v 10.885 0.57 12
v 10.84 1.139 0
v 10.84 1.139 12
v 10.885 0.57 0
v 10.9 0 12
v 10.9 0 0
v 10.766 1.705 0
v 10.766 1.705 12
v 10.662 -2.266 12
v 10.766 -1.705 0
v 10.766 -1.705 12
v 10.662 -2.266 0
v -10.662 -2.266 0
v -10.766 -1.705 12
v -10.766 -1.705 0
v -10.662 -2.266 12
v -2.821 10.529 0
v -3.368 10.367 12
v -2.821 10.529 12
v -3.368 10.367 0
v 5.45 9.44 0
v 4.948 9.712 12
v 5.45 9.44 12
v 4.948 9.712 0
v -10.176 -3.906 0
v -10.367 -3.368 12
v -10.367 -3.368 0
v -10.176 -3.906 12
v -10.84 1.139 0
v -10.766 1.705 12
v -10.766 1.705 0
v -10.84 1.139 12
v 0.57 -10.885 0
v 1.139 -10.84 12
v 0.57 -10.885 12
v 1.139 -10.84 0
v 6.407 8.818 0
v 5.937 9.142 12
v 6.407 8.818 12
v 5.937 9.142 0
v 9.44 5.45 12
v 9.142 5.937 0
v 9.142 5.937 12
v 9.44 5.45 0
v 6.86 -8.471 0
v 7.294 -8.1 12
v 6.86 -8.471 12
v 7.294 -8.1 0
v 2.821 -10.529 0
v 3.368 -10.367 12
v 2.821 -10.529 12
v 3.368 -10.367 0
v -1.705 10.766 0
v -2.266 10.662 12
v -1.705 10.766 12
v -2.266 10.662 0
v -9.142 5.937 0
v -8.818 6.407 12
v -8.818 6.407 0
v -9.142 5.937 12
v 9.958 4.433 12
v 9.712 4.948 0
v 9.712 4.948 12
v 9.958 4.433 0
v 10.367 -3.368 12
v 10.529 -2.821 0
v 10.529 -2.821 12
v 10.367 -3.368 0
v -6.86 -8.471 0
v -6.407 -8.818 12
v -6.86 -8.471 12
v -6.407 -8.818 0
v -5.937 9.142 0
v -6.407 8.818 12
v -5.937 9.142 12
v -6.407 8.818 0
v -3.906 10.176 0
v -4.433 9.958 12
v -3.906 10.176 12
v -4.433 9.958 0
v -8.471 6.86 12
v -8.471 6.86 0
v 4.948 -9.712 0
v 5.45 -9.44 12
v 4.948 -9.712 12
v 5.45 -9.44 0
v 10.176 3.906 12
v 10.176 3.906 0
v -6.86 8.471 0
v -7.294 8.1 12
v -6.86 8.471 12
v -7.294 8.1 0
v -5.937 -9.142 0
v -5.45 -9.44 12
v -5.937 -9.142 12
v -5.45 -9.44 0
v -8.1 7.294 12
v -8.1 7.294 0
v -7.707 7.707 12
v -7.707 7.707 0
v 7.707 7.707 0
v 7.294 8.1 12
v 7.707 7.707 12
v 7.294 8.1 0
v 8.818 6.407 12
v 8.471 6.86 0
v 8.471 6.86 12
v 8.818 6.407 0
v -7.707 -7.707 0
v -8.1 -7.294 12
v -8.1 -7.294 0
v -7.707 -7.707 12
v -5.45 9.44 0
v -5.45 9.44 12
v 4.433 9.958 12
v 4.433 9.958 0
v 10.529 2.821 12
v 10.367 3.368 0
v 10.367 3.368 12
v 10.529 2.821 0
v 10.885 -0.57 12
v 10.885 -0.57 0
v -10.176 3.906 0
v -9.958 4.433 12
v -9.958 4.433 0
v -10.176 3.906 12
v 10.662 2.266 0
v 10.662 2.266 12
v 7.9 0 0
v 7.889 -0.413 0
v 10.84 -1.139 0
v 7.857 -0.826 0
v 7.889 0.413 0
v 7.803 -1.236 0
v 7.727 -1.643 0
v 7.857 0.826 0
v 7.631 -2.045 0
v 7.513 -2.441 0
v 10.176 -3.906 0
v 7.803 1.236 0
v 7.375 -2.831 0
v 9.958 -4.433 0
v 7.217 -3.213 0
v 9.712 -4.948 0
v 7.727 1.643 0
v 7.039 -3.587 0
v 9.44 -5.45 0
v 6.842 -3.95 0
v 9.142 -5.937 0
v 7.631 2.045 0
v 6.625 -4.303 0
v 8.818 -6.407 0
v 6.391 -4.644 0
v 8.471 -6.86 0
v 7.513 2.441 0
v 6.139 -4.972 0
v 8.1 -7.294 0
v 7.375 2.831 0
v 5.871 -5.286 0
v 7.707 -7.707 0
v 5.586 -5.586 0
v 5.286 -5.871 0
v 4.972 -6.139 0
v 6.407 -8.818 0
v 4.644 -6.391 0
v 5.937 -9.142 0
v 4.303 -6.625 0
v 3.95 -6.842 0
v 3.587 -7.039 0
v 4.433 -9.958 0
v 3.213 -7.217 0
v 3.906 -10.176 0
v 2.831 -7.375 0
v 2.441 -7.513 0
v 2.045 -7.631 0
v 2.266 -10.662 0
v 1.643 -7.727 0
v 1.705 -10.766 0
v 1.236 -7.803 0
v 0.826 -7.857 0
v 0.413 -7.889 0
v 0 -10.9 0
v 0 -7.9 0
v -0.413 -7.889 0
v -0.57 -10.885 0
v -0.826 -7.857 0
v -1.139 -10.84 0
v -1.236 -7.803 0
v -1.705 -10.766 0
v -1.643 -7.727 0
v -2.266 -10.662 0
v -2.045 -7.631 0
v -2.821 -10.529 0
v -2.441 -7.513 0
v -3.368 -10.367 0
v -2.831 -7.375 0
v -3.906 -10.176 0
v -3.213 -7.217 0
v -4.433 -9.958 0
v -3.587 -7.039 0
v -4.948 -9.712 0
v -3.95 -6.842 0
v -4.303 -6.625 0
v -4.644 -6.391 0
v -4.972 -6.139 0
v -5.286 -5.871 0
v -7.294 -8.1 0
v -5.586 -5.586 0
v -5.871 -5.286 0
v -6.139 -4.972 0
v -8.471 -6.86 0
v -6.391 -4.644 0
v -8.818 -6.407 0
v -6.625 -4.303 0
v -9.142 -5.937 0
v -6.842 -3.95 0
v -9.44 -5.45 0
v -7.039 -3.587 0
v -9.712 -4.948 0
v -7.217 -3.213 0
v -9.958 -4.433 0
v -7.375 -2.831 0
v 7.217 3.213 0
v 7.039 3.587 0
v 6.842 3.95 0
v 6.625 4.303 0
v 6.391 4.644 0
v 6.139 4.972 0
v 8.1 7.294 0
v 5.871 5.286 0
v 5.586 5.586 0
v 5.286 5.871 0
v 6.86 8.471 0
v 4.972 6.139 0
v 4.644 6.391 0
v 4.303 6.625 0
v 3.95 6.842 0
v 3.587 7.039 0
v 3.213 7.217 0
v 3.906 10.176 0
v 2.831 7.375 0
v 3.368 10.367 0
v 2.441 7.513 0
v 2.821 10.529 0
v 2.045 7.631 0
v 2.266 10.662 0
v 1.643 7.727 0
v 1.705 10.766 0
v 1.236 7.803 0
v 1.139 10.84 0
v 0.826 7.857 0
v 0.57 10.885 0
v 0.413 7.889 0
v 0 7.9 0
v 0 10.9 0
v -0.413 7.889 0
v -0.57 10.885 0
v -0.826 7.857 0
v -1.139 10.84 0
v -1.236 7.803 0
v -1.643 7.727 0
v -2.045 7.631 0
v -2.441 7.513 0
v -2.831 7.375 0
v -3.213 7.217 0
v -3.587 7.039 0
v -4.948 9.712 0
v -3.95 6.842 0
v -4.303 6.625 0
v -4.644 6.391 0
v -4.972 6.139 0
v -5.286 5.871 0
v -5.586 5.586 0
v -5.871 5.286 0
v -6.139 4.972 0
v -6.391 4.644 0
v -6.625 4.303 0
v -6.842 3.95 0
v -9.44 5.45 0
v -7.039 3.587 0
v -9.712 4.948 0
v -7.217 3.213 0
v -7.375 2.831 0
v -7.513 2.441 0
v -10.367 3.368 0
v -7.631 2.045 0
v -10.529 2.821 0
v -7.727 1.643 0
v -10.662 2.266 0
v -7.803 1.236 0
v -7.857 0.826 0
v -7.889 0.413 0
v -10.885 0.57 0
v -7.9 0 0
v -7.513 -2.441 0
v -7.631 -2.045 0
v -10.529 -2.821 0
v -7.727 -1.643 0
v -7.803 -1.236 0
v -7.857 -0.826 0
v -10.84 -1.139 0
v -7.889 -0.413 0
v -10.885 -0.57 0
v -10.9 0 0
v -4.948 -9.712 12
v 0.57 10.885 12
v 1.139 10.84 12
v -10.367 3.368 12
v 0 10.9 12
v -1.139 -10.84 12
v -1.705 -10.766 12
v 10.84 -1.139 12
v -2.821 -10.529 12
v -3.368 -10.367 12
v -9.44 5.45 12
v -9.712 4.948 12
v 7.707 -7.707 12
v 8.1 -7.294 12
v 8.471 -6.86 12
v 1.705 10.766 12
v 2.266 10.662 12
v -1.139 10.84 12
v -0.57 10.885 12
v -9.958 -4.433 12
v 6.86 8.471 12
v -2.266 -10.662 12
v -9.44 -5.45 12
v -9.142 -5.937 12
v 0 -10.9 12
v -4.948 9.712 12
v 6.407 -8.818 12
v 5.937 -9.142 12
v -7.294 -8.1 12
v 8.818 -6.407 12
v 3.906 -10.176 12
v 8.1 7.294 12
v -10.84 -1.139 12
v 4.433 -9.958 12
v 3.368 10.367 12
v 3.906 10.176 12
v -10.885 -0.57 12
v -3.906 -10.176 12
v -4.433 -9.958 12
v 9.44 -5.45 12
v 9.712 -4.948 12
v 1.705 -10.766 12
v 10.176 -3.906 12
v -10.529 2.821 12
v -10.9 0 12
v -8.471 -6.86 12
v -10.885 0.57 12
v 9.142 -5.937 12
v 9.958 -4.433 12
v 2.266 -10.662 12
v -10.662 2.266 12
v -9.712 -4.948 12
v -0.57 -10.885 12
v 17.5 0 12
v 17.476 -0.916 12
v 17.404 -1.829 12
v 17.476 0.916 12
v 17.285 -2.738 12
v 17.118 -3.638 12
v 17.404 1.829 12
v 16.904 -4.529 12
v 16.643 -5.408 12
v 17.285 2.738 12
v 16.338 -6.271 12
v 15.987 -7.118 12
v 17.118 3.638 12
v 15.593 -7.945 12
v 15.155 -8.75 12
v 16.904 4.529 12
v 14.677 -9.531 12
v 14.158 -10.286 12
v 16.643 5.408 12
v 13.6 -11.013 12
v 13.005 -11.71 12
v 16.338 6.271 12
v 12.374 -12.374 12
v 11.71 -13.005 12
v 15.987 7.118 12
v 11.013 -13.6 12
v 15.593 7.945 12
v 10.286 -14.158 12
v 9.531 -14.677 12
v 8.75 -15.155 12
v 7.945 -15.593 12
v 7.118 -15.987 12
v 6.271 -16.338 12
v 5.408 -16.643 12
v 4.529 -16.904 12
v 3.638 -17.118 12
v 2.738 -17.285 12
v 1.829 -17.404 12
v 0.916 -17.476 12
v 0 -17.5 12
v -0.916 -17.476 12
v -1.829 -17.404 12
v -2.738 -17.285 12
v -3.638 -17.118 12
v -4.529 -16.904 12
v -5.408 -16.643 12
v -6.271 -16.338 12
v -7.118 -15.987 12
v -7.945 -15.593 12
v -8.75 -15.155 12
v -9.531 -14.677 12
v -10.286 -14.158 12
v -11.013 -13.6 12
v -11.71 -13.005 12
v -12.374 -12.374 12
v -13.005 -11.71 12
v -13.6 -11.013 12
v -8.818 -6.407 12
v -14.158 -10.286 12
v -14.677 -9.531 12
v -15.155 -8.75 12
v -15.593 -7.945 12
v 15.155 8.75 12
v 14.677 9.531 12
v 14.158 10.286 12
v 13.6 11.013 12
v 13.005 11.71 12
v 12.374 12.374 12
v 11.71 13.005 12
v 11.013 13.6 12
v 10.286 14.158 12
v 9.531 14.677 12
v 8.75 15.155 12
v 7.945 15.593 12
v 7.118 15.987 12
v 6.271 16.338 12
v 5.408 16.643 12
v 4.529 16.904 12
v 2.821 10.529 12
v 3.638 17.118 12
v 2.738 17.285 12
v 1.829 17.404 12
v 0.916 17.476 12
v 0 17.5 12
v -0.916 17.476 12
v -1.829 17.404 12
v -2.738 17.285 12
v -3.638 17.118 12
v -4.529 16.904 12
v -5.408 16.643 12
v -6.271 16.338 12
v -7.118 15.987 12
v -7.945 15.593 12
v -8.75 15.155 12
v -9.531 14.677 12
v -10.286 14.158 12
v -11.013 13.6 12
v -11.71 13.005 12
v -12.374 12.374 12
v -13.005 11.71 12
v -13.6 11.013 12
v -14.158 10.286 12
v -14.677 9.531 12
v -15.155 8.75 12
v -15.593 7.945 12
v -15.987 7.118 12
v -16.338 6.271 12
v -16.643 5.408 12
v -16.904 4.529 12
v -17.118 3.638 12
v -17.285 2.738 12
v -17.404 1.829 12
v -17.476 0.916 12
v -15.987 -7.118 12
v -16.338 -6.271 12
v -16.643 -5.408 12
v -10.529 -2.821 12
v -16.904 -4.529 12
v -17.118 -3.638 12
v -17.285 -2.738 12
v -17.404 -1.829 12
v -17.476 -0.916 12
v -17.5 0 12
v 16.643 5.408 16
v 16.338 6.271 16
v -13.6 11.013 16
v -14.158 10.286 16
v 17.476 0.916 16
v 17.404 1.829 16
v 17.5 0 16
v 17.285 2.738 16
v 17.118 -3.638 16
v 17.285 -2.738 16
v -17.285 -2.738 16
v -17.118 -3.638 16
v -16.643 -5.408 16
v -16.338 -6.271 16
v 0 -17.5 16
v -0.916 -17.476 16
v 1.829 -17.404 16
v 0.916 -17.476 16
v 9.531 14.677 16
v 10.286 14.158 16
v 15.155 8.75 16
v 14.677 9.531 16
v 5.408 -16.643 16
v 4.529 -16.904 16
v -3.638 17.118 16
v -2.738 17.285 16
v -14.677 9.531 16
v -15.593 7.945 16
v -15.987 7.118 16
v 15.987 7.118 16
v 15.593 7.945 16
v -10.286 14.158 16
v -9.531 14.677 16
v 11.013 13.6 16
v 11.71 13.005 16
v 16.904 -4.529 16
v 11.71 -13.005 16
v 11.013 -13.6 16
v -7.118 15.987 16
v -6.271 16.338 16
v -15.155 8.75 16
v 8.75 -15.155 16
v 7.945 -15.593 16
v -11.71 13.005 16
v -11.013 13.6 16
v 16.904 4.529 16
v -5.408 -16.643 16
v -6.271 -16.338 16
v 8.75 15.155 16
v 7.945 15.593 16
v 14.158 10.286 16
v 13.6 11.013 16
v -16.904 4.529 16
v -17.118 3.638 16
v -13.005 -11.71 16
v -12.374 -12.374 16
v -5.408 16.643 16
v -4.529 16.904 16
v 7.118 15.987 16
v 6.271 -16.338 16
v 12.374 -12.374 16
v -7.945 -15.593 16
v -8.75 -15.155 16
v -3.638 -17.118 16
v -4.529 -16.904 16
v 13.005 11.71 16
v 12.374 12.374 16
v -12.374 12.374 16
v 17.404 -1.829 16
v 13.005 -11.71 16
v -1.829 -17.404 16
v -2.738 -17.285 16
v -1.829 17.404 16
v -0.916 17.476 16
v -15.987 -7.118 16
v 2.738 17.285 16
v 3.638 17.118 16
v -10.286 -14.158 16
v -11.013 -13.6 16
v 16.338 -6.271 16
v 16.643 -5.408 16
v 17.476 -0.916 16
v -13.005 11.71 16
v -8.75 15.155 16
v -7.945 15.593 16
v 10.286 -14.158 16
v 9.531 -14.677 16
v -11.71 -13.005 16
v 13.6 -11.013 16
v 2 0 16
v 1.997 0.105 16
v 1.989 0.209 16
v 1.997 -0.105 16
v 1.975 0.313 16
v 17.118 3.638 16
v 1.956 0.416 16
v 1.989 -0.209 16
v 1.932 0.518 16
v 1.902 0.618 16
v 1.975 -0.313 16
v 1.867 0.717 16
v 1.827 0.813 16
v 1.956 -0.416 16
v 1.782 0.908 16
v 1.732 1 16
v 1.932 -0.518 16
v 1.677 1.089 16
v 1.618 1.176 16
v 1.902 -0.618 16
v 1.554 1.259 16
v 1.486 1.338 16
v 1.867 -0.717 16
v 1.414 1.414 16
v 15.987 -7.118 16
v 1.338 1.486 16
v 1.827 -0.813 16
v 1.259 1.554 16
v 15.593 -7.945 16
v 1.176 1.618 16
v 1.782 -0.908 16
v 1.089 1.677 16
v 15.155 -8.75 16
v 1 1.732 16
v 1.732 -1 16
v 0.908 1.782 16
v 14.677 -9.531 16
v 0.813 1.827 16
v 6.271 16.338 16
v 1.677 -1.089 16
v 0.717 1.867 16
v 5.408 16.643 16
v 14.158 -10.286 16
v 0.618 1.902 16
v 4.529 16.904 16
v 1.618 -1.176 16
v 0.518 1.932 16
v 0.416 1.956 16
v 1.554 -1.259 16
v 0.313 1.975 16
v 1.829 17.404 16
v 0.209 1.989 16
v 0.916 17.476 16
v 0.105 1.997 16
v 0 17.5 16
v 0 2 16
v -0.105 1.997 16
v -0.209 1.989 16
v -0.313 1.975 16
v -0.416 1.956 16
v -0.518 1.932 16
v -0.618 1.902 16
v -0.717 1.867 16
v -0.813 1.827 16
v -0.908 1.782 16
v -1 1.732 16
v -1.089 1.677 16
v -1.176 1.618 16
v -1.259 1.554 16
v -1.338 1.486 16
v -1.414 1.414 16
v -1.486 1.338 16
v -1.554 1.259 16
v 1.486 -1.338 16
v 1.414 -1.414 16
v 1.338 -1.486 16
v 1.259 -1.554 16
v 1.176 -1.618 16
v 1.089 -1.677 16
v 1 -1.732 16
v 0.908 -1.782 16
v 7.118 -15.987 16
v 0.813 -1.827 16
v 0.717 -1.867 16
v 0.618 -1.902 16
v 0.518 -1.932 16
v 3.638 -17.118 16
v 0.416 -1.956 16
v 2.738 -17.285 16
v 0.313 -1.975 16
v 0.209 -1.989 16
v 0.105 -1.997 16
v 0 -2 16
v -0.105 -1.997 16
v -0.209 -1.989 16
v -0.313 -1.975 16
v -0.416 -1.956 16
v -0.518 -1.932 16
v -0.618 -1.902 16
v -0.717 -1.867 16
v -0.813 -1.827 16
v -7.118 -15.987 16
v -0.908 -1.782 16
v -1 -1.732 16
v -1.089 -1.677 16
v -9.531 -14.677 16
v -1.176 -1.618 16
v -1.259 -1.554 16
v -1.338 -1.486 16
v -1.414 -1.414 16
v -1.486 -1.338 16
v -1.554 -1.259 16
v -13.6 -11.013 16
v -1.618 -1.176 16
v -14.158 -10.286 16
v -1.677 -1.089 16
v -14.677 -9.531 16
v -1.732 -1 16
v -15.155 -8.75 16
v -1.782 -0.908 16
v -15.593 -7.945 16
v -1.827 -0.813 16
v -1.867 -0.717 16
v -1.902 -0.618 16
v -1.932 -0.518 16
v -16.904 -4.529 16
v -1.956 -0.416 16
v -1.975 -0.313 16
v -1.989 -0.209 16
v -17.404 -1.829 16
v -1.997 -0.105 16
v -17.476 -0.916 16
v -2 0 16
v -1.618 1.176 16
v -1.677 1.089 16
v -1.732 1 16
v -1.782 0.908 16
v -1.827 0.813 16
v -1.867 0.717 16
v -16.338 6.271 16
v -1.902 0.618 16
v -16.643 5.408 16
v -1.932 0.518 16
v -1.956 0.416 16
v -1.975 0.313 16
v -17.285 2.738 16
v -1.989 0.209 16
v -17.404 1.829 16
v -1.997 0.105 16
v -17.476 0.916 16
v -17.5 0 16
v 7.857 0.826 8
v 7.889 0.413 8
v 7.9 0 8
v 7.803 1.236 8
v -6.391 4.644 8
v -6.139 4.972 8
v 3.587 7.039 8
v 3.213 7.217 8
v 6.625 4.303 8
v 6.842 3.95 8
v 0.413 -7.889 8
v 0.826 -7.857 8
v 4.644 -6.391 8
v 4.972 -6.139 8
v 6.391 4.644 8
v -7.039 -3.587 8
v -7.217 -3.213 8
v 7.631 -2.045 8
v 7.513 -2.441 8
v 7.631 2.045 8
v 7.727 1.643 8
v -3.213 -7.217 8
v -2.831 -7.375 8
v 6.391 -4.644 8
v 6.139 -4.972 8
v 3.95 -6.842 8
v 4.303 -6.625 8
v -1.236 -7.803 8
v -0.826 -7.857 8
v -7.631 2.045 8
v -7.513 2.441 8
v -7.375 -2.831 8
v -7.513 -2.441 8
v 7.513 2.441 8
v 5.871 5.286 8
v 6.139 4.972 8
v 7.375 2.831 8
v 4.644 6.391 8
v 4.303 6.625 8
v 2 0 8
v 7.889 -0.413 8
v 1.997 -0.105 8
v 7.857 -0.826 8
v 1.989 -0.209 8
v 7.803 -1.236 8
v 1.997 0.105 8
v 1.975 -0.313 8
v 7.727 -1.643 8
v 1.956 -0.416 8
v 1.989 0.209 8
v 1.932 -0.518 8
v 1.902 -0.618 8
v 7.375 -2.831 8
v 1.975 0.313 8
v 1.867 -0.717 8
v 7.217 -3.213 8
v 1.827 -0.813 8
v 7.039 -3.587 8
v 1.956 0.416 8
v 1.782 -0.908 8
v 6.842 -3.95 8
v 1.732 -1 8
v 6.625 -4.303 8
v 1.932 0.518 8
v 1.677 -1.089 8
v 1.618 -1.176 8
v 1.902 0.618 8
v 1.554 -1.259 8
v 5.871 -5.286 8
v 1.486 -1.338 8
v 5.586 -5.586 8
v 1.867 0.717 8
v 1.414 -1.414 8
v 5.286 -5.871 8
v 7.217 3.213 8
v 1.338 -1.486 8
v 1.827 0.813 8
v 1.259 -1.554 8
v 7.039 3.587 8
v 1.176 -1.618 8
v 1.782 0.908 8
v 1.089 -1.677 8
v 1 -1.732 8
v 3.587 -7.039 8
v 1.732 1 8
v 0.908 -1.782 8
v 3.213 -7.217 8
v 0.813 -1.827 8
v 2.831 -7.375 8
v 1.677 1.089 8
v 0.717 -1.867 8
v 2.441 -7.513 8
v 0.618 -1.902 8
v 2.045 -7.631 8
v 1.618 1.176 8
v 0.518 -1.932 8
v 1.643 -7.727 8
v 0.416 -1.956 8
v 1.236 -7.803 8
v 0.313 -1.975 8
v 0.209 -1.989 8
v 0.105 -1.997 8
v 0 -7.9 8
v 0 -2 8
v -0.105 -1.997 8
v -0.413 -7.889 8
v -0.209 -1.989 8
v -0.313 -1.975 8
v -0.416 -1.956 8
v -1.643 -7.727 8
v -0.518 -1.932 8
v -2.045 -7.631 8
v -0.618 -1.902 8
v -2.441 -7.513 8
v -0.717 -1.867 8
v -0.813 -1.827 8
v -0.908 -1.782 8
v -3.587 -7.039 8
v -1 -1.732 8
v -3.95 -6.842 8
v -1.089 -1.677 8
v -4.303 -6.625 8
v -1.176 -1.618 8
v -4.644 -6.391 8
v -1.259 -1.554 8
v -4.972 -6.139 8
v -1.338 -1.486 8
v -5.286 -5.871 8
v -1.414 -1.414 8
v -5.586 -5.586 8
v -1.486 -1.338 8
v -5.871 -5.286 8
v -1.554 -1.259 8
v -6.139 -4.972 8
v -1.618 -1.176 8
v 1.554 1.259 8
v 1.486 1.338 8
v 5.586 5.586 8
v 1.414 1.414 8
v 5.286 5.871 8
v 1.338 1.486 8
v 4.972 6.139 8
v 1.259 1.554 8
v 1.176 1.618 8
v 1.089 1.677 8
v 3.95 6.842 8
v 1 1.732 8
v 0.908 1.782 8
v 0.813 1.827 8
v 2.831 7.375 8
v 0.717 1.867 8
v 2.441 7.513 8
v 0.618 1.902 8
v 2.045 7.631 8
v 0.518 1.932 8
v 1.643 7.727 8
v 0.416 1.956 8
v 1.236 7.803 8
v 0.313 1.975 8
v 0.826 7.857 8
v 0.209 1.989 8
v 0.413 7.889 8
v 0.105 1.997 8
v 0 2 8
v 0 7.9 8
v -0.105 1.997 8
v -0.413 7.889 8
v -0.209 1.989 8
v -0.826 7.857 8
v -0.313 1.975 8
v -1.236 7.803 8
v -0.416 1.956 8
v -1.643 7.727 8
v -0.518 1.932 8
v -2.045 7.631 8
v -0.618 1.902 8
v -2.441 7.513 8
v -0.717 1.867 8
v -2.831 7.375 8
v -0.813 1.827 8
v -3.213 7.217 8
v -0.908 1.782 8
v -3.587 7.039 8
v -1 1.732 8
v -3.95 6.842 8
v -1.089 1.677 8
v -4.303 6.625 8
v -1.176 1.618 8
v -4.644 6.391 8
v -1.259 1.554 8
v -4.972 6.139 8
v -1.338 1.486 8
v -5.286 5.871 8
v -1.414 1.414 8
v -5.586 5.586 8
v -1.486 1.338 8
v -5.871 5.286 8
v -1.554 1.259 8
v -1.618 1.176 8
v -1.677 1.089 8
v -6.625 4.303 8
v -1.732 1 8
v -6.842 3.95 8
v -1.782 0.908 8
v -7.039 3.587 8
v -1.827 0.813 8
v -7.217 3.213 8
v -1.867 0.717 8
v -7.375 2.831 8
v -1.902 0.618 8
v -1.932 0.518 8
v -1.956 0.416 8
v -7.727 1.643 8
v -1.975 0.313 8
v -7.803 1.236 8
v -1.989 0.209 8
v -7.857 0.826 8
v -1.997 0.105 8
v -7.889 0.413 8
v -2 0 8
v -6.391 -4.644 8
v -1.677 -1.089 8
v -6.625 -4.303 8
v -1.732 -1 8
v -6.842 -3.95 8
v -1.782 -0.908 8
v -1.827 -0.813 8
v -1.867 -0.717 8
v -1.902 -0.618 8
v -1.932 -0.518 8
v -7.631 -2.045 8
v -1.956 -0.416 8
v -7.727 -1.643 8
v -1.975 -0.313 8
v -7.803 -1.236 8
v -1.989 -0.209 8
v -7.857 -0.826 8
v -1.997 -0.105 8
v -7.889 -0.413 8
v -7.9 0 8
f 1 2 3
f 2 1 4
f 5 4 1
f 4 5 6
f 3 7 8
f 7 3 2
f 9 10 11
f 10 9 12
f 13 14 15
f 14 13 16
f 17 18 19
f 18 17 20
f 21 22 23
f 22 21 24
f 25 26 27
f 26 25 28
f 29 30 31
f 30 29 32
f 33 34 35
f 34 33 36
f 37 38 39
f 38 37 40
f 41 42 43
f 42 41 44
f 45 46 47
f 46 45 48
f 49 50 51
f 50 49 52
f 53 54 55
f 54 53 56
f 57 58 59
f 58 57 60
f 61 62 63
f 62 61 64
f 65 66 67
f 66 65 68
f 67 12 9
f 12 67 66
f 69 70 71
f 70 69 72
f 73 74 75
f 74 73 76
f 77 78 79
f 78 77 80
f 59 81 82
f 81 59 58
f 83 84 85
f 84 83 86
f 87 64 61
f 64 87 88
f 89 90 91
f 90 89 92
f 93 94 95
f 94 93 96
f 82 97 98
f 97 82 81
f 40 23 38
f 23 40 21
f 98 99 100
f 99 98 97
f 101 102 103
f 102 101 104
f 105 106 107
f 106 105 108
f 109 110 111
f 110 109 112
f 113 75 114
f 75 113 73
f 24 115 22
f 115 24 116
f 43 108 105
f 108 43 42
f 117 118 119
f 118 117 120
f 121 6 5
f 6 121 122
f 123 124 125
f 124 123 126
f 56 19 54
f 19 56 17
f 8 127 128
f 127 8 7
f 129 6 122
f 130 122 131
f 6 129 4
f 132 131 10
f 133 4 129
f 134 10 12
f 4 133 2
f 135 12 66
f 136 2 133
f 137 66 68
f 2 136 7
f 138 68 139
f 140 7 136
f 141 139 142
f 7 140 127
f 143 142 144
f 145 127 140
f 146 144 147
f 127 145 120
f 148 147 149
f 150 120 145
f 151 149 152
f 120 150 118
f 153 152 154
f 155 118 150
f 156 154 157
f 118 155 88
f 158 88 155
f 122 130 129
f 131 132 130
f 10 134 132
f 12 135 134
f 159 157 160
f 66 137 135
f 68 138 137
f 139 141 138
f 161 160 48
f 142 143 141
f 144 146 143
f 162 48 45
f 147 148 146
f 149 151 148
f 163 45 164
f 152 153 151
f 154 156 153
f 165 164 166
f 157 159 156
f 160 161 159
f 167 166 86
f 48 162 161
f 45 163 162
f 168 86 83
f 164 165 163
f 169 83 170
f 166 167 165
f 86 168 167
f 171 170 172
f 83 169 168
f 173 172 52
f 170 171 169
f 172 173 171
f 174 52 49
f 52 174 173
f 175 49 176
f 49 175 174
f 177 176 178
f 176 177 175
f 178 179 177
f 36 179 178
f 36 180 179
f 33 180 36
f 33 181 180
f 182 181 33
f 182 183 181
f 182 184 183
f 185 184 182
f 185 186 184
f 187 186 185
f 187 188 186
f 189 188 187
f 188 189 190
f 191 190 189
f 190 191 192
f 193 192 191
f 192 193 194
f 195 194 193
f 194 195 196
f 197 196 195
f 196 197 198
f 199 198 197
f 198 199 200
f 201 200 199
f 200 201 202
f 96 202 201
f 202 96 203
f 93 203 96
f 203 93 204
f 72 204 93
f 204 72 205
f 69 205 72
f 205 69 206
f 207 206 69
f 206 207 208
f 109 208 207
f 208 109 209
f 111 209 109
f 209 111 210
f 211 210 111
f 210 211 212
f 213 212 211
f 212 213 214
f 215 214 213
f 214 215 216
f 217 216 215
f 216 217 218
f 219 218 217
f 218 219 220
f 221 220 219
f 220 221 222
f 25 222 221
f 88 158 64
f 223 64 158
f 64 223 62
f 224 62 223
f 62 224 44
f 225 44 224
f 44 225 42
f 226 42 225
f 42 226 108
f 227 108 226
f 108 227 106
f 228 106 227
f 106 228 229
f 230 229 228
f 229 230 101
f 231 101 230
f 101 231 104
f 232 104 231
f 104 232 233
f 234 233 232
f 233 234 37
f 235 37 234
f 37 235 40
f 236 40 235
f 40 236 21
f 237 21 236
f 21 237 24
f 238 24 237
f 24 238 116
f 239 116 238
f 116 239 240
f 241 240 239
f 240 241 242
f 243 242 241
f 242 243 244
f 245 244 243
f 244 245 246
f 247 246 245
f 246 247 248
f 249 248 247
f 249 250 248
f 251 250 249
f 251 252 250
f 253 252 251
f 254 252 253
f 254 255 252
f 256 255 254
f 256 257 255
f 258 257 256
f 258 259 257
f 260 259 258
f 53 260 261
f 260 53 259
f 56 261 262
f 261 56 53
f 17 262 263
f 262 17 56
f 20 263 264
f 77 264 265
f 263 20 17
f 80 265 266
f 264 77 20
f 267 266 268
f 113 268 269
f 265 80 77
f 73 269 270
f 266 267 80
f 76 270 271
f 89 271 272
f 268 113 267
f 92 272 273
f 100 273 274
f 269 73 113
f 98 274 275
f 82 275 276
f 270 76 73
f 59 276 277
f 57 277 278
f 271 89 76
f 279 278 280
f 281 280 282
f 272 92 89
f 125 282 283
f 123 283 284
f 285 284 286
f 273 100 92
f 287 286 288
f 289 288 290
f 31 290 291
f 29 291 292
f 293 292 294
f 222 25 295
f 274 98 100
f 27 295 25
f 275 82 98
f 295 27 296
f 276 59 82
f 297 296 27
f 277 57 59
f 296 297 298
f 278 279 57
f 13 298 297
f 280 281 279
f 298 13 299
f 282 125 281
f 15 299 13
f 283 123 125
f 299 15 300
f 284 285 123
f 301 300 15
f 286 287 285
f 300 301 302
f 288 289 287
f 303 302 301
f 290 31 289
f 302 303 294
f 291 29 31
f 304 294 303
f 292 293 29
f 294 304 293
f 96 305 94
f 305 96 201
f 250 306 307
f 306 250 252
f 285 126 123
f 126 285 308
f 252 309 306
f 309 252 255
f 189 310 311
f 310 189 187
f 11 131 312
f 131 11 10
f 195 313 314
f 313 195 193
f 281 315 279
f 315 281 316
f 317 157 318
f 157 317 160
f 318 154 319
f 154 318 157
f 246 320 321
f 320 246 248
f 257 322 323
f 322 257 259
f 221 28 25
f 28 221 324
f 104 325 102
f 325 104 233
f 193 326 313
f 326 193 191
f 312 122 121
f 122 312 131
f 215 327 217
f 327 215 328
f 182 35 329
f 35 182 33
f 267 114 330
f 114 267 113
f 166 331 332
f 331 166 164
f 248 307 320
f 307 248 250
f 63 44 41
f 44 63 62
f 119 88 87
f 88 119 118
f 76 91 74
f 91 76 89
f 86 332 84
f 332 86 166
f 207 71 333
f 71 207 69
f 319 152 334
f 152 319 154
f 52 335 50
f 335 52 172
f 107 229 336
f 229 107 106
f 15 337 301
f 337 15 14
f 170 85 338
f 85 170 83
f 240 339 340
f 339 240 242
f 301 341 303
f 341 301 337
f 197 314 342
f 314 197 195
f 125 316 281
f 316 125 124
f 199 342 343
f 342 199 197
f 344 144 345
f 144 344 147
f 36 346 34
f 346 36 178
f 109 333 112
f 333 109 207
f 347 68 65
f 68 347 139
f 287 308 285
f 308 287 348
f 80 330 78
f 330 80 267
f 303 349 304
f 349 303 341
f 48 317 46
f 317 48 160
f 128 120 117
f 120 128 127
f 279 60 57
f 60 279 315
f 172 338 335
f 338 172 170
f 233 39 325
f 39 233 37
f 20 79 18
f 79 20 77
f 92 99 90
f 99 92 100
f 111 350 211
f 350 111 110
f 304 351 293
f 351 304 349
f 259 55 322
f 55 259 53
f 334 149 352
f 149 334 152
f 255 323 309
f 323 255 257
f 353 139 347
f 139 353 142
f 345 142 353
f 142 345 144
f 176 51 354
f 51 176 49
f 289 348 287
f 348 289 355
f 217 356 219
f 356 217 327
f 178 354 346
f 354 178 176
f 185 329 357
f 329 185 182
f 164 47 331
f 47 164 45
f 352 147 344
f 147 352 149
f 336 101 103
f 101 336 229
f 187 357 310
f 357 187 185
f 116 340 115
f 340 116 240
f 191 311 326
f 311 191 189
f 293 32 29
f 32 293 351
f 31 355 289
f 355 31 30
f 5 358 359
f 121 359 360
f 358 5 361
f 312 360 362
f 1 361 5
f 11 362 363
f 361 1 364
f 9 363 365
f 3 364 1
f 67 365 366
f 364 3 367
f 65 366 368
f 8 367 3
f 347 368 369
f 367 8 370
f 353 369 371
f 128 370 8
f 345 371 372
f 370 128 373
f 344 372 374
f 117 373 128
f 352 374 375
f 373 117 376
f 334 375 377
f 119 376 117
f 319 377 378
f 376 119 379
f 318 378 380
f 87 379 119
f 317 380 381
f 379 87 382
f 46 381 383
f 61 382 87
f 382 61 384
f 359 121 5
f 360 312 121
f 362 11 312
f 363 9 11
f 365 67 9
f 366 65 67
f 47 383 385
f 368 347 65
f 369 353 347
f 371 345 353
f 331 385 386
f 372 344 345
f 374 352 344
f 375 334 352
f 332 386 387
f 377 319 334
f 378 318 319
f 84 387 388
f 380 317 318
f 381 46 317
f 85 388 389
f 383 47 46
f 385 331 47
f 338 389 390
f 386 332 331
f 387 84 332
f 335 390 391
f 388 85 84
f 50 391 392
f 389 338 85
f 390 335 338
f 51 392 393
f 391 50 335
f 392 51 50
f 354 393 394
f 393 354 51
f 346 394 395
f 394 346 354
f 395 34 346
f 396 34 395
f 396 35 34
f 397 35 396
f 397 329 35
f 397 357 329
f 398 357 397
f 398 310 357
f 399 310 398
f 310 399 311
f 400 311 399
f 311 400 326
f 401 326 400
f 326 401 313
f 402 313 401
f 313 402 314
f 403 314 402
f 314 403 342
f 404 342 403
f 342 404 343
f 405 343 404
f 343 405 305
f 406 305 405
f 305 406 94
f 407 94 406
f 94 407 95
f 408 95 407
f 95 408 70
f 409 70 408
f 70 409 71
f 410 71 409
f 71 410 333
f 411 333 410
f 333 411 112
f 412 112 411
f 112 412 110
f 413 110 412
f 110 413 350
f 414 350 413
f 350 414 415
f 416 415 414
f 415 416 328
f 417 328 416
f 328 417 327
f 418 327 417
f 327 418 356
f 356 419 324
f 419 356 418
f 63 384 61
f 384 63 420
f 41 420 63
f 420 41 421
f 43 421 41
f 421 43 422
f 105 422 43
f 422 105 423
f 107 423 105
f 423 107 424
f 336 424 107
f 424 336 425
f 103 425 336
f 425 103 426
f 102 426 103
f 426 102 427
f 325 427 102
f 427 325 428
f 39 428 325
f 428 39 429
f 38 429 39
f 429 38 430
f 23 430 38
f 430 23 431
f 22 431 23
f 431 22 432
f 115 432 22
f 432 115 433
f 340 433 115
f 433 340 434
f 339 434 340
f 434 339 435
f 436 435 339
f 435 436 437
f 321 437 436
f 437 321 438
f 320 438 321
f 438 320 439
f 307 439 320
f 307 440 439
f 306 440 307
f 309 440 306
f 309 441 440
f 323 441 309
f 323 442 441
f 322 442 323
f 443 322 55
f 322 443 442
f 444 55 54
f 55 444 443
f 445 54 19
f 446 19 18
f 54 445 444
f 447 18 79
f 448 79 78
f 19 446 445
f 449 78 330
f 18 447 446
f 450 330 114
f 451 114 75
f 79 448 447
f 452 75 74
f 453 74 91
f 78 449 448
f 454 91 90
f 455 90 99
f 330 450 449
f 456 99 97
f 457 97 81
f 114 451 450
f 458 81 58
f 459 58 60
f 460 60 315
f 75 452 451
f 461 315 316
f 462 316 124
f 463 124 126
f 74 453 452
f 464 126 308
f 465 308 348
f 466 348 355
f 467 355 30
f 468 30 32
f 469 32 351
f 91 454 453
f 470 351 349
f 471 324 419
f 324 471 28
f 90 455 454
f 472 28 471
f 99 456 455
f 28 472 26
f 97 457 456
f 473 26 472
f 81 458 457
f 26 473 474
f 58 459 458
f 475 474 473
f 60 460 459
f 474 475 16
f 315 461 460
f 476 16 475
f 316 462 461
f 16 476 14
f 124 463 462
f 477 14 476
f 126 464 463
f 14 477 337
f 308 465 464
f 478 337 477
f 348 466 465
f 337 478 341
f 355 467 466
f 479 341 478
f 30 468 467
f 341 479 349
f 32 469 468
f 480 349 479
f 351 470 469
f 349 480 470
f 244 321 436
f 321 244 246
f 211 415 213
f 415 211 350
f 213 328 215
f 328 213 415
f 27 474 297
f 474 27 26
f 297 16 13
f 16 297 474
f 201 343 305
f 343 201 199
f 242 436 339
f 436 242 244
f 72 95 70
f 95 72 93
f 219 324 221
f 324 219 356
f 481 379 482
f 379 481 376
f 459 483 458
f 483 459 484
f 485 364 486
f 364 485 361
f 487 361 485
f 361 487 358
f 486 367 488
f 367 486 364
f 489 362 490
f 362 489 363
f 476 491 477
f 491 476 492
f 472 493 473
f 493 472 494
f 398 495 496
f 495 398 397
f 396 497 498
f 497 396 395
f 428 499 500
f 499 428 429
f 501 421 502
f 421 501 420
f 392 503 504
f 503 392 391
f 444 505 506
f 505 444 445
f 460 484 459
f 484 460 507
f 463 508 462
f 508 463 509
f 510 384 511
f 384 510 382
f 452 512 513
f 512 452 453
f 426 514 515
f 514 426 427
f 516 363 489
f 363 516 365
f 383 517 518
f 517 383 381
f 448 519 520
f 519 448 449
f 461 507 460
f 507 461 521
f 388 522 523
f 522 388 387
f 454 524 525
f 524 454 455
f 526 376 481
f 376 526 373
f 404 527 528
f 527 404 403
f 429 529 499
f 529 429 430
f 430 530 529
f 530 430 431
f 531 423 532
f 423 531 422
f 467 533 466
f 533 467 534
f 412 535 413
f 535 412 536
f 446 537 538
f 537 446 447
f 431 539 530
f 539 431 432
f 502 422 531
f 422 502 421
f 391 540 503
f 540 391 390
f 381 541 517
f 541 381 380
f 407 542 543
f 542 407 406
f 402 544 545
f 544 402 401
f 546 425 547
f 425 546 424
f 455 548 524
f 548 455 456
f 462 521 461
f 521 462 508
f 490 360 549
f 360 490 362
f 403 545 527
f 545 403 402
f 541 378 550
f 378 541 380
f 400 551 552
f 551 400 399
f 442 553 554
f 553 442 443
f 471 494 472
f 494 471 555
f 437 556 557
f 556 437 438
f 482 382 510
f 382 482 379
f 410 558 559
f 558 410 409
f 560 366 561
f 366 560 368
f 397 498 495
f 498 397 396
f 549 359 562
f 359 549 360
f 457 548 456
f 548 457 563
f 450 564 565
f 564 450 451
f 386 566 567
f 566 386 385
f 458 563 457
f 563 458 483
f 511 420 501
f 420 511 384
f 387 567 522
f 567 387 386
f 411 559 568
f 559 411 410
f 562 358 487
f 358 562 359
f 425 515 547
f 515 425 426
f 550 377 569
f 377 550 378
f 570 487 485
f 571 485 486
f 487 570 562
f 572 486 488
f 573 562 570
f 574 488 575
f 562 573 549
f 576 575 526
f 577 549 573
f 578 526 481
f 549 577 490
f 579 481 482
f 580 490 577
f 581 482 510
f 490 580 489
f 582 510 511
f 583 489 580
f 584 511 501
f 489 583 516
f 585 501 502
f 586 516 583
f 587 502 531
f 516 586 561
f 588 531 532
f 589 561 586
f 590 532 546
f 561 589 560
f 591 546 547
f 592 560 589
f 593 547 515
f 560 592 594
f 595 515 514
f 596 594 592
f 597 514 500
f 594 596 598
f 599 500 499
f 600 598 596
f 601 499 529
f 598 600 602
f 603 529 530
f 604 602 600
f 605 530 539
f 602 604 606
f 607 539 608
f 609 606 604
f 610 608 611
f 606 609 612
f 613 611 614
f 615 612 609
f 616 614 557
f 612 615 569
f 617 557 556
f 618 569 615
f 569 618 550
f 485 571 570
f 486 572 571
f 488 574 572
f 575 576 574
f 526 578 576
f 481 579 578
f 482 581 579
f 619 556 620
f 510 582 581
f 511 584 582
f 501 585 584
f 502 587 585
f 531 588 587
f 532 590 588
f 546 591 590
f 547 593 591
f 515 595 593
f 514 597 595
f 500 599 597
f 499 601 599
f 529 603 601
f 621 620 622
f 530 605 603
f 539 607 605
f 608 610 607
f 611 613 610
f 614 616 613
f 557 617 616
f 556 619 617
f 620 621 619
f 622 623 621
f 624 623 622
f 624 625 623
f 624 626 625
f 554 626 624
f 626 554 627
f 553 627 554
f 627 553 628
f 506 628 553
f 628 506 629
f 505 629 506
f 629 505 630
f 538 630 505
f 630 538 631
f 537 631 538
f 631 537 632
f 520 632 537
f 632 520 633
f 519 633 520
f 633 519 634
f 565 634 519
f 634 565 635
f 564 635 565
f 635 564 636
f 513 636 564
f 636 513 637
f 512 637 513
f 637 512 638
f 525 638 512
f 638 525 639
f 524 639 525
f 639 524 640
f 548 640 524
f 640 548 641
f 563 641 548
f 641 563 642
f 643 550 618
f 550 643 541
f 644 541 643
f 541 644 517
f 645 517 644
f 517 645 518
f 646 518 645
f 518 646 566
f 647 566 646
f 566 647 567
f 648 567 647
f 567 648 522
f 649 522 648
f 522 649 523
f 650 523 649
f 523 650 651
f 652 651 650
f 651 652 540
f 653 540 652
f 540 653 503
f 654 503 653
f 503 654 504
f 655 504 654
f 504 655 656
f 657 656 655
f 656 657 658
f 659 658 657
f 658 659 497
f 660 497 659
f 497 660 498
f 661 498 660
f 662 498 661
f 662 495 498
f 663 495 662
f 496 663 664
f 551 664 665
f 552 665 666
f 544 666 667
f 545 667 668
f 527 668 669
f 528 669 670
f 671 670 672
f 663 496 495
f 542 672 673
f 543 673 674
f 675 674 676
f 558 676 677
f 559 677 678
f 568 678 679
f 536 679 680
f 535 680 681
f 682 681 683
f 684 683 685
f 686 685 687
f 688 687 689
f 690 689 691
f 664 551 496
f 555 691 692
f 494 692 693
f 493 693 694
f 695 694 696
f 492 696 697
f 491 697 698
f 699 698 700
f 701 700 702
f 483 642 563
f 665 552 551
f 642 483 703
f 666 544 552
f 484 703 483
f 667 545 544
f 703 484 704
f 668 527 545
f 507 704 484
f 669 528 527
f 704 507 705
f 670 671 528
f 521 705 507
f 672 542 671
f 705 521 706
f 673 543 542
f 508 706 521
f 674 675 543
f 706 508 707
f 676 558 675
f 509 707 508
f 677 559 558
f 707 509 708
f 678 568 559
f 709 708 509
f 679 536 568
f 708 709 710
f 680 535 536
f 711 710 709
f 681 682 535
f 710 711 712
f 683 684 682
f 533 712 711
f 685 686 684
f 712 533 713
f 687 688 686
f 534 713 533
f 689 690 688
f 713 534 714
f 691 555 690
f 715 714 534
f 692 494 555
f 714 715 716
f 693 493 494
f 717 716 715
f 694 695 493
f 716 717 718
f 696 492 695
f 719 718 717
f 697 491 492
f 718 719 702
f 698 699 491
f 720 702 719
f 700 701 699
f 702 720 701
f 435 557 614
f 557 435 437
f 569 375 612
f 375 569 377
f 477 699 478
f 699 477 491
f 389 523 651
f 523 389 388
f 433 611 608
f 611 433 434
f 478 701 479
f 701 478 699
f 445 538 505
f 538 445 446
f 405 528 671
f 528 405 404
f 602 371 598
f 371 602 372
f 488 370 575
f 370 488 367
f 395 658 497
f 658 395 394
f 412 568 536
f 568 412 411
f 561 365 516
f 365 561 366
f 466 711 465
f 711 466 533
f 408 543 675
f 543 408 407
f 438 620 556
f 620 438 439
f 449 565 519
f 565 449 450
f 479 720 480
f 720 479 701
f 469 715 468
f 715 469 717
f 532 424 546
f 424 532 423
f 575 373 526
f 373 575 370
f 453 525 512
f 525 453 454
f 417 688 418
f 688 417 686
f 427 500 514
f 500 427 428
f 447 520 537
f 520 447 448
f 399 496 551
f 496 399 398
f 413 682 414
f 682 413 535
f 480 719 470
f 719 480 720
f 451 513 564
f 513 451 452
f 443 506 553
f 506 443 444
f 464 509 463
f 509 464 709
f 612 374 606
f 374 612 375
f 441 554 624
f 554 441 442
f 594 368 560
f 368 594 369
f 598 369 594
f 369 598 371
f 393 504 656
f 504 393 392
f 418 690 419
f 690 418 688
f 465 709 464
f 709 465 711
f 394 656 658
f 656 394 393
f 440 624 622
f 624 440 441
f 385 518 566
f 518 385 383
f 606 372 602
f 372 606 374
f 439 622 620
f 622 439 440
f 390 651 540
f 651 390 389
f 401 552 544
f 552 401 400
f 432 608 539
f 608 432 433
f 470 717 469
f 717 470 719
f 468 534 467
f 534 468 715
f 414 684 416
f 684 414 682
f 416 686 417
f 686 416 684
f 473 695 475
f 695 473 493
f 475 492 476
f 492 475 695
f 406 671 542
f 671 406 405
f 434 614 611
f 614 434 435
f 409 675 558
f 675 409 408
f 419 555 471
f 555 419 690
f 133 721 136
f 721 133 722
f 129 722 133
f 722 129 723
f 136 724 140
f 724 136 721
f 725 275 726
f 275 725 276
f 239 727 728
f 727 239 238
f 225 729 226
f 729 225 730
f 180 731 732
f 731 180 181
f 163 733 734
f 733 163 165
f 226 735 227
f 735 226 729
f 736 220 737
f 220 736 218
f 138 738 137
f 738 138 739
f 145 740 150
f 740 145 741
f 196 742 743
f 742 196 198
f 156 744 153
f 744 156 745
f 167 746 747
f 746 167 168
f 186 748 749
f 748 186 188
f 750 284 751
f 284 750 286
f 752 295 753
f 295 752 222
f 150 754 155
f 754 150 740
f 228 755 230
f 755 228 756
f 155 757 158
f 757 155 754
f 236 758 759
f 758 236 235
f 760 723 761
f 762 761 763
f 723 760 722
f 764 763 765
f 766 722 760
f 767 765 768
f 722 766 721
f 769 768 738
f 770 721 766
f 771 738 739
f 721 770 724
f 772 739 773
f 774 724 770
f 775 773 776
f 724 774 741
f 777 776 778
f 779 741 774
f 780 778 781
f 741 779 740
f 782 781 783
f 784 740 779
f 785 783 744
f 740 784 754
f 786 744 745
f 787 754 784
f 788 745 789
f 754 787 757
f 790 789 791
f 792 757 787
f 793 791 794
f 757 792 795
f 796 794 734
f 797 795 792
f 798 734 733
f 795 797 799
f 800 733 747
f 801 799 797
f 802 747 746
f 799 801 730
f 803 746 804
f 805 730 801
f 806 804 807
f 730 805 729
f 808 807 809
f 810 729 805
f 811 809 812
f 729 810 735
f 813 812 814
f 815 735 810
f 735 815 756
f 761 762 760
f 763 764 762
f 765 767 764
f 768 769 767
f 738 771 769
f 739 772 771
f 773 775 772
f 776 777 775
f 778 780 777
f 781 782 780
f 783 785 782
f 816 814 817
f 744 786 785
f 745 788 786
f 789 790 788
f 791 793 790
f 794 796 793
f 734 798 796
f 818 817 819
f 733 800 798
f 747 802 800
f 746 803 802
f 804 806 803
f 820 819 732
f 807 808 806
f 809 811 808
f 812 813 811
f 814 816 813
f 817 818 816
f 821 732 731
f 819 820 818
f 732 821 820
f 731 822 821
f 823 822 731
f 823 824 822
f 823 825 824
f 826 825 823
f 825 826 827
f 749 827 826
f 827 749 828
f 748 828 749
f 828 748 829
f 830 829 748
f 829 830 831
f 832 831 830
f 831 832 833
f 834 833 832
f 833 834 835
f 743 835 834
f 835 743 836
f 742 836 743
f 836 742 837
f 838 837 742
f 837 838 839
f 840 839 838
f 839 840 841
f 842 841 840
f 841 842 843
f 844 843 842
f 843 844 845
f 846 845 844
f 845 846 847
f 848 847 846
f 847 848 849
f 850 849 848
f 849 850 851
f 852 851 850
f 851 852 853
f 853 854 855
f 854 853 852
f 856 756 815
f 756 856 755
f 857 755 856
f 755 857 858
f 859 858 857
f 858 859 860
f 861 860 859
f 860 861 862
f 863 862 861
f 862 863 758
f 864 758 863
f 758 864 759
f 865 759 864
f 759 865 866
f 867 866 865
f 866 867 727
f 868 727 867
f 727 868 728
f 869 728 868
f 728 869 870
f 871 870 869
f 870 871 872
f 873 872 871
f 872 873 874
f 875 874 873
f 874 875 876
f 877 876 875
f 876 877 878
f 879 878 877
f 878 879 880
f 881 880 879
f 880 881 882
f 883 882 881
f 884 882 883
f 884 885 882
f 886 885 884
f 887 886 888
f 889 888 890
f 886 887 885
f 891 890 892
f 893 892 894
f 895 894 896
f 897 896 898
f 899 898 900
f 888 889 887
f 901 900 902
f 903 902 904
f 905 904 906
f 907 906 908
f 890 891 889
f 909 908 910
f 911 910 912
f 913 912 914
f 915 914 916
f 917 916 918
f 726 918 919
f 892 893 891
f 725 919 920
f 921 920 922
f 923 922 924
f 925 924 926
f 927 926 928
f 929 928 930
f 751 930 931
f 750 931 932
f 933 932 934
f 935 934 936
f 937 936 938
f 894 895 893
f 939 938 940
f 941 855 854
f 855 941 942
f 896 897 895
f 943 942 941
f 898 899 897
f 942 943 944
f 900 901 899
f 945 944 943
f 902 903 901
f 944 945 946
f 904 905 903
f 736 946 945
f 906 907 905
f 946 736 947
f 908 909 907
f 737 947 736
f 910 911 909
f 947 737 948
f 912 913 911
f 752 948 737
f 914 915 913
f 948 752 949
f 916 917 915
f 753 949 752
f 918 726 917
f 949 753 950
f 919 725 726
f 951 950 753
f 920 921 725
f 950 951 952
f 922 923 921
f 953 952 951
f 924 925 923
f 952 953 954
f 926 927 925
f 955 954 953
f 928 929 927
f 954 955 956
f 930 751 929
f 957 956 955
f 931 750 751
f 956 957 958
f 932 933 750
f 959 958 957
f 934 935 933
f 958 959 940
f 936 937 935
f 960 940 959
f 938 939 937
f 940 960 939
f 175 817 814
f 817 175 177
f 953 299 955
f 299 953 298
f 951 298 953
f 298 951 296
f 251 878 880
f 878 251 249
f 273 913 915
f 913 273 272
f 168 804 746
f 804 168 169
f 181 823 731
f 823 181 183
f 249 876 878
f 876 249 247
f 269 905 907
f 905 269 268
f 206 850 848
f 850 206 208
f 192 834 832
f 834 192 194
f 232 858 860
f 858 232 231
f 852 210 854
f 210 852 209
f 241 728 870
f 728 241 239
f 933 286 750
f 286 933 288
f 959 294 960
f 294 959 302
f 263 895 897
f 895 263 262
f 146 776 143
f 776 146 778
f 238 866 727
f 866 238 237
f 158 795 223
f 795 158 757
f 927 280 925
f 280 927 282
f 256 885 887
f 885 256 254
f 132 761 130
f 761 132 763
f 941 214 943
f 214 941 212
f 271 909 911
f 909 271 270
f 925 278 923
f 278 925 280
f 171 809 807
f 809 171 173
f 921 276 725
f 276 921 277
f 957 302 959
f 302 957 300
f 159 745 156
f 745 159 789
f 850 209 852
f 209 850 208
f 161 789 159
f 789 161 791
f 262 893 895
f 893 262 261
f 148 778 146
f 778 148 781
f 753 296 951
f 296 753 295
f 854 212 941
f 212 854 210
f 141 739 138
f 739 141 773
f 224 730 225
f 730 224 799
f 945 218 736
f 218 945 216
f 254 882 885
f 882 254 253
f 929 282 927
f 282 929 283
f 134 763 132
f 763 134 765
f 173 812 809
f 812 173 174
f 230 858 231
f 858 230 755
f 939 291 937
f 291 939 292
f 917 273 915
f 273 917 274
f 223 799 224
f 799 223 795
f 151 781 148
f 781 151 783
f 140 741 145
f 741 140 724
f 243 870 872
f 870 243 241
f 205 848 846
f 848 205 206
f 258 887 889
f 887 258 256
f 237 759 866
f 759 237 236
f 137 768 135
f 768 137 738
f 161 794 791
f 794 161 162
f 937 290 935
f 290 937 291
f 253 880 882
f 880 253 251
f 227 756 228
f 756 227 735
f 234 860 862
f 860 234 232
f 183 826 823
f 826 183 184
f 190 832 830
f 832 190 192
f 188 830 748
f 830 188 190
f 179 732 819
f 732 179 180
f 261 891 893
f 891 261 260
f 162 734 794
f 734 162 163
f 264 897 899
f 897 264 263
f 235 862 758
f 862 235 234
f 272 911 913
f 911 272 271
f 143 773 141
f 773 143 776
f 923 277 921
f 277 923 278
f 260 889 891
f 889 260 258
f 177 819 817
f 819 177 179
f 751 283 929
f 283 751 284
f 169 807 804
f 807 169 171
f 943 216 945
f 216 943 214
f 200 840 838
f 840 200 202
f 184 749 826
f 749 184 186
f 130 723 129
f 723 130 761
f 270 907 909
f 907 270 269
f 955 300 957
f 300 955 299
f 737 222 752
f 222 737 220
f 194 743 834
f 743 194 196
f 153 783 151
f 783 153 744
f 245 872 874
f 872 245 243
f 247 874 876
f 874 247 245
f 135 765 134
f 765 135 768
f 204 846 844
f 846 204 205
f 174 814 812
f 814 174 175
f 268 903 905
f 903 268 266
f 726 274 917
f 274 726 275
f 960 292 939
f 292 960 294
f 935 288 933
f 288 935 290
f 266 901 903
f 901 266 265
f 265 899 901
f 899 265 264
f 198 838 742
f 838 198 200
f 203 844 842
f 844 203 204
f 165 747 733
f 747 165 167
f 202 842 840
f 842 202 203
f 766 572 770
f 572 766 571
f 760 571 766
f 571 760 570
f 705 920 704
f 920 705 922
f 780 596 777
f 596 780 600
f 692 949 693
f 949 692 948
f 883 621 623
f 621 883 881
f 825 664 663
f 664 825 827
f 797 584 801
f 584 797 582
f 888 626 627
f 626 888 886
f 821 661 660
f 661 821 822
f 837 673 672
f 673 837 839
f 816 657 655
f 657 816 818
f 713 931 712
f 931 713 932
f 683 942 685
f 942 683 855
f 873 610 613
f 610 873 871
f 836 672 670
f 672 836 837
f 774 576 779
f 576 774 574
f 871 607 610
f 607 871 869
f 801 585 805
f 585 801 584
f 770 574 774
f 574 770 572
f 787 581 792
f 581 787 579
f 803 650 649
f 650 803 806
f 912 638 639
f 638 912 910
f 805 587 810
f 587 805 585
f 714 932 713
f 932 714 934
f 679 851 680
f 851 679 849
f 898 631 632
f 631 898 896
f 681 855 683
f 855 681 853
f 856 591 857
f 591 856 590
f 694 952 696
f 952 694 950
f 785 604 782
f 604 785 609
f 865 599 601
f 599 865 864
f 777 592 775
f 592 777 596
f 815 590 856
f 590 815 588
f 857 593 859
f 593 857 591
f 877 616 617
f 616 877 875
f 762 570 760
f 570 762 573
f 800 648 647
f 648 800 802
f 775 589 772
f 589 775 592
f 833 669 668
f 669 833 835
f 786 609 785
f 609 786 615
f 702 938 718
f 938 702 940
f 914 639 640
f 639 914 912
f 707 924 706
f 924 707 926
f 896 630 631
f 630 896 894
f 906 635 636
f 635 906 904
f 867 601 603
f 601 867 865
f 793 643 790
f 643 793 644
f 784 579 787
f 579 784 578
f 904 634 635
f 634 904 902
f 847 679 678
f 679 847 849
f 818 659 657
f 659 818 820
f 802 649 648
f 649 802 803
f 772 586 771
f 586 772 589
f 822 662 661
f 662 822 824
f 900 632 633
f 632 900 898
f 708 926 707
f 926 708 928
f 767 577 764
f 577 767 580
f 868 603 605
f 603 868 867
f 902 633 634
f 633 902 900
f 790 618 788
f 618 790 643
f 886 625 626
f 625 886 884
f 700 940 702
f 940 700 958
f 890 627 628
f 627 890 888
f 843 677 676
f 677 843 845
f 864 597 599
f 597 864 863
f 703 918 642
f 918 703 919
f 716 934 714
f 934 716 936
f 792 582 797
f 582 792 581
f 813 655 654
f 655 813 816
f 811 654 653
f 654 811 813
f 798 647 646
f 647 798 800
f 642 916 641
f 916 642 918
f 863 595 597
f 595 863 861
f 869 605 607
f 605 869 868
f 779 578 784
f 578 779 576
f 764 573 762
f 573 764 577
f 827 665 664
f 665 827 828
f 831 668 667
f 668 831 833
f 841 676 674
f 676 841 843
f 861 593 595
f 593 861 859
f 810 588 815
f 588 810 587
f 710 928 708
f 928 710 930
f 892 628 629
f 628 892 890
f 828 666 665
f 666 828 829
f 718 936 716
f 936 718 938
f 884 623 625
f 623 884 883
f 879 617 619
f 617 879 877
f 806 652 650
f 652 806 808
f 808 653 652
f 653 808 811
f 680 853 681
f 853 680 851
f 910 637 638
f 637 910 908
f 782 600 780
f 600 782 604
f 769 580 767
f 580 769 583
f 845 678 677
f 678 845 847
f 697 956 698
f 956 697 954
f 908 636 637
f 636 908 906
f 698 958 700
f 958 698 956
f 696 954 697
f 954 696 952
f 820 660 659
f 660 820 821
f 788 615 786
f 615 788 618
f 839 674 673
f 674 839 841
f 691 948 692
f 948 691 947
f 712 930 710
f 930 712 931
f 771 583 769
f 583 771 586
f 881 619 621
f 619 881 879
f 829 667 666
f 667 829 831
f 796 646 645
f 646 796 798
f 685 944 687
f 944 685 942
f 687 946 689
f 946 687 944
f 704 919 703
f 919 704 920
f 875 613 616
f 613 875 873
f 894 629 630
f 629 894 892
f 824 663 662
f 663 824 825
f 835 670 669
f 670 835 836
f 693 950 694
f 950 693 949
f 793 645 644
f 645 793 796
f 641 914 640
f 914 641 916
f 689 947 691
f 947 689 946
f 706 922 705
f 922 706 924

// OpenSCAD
// Redukce / zátka pro hrdlo vzduchového vaku
// Všechny rozměry v mm

// --- Parametry ---
hrdlo_d      = 22;   // vnější průměr zátky = průměr hrdla
hrdlo_hloubka = 12;   // hloubka zasunutí do hrdla
limec_d      = 35;   // průměr límce
limec_v      = 4;    // výška límce
otvor_d      = 4;    // průměr otvoru pro trubičku
dno_t        = 4;    // tloušťka dna
stena_t      = 3;    // tloušťka boční stěny (dutá zátka)

// Vůle pro 3D tisk (zmenšení průměru zasouvané části)
vule         = 0.2;

$fn = 120;

module zatka() {
    difference() {
        union() {
            // Zasouvací část (do hrdla)
            cylinder(d = hrdlo_d - vule, h = hrdlo_hloubka);

            // Límec (zarážka) nad zasouvací částí
            translate([0, 0, hrdlo_hloubka])
                cylinder(d = limec_d, h = limec_v);
        }

        // Dutina zespodu (vnitřek vaku)
        translate([0, 0, -0.01])
            cylinder(d = hrdlo_d - vule - 2 * stena_t,
                     h = hrdlo_hloubka - dno_t + 0.01);

        // Průchozí otvor pro trubičku
        translate([0, 0, -1])
            cylinder(d = otvor_d, h = hrdlo_hloubka + limec_v + 2);
    }
}

zatka();
